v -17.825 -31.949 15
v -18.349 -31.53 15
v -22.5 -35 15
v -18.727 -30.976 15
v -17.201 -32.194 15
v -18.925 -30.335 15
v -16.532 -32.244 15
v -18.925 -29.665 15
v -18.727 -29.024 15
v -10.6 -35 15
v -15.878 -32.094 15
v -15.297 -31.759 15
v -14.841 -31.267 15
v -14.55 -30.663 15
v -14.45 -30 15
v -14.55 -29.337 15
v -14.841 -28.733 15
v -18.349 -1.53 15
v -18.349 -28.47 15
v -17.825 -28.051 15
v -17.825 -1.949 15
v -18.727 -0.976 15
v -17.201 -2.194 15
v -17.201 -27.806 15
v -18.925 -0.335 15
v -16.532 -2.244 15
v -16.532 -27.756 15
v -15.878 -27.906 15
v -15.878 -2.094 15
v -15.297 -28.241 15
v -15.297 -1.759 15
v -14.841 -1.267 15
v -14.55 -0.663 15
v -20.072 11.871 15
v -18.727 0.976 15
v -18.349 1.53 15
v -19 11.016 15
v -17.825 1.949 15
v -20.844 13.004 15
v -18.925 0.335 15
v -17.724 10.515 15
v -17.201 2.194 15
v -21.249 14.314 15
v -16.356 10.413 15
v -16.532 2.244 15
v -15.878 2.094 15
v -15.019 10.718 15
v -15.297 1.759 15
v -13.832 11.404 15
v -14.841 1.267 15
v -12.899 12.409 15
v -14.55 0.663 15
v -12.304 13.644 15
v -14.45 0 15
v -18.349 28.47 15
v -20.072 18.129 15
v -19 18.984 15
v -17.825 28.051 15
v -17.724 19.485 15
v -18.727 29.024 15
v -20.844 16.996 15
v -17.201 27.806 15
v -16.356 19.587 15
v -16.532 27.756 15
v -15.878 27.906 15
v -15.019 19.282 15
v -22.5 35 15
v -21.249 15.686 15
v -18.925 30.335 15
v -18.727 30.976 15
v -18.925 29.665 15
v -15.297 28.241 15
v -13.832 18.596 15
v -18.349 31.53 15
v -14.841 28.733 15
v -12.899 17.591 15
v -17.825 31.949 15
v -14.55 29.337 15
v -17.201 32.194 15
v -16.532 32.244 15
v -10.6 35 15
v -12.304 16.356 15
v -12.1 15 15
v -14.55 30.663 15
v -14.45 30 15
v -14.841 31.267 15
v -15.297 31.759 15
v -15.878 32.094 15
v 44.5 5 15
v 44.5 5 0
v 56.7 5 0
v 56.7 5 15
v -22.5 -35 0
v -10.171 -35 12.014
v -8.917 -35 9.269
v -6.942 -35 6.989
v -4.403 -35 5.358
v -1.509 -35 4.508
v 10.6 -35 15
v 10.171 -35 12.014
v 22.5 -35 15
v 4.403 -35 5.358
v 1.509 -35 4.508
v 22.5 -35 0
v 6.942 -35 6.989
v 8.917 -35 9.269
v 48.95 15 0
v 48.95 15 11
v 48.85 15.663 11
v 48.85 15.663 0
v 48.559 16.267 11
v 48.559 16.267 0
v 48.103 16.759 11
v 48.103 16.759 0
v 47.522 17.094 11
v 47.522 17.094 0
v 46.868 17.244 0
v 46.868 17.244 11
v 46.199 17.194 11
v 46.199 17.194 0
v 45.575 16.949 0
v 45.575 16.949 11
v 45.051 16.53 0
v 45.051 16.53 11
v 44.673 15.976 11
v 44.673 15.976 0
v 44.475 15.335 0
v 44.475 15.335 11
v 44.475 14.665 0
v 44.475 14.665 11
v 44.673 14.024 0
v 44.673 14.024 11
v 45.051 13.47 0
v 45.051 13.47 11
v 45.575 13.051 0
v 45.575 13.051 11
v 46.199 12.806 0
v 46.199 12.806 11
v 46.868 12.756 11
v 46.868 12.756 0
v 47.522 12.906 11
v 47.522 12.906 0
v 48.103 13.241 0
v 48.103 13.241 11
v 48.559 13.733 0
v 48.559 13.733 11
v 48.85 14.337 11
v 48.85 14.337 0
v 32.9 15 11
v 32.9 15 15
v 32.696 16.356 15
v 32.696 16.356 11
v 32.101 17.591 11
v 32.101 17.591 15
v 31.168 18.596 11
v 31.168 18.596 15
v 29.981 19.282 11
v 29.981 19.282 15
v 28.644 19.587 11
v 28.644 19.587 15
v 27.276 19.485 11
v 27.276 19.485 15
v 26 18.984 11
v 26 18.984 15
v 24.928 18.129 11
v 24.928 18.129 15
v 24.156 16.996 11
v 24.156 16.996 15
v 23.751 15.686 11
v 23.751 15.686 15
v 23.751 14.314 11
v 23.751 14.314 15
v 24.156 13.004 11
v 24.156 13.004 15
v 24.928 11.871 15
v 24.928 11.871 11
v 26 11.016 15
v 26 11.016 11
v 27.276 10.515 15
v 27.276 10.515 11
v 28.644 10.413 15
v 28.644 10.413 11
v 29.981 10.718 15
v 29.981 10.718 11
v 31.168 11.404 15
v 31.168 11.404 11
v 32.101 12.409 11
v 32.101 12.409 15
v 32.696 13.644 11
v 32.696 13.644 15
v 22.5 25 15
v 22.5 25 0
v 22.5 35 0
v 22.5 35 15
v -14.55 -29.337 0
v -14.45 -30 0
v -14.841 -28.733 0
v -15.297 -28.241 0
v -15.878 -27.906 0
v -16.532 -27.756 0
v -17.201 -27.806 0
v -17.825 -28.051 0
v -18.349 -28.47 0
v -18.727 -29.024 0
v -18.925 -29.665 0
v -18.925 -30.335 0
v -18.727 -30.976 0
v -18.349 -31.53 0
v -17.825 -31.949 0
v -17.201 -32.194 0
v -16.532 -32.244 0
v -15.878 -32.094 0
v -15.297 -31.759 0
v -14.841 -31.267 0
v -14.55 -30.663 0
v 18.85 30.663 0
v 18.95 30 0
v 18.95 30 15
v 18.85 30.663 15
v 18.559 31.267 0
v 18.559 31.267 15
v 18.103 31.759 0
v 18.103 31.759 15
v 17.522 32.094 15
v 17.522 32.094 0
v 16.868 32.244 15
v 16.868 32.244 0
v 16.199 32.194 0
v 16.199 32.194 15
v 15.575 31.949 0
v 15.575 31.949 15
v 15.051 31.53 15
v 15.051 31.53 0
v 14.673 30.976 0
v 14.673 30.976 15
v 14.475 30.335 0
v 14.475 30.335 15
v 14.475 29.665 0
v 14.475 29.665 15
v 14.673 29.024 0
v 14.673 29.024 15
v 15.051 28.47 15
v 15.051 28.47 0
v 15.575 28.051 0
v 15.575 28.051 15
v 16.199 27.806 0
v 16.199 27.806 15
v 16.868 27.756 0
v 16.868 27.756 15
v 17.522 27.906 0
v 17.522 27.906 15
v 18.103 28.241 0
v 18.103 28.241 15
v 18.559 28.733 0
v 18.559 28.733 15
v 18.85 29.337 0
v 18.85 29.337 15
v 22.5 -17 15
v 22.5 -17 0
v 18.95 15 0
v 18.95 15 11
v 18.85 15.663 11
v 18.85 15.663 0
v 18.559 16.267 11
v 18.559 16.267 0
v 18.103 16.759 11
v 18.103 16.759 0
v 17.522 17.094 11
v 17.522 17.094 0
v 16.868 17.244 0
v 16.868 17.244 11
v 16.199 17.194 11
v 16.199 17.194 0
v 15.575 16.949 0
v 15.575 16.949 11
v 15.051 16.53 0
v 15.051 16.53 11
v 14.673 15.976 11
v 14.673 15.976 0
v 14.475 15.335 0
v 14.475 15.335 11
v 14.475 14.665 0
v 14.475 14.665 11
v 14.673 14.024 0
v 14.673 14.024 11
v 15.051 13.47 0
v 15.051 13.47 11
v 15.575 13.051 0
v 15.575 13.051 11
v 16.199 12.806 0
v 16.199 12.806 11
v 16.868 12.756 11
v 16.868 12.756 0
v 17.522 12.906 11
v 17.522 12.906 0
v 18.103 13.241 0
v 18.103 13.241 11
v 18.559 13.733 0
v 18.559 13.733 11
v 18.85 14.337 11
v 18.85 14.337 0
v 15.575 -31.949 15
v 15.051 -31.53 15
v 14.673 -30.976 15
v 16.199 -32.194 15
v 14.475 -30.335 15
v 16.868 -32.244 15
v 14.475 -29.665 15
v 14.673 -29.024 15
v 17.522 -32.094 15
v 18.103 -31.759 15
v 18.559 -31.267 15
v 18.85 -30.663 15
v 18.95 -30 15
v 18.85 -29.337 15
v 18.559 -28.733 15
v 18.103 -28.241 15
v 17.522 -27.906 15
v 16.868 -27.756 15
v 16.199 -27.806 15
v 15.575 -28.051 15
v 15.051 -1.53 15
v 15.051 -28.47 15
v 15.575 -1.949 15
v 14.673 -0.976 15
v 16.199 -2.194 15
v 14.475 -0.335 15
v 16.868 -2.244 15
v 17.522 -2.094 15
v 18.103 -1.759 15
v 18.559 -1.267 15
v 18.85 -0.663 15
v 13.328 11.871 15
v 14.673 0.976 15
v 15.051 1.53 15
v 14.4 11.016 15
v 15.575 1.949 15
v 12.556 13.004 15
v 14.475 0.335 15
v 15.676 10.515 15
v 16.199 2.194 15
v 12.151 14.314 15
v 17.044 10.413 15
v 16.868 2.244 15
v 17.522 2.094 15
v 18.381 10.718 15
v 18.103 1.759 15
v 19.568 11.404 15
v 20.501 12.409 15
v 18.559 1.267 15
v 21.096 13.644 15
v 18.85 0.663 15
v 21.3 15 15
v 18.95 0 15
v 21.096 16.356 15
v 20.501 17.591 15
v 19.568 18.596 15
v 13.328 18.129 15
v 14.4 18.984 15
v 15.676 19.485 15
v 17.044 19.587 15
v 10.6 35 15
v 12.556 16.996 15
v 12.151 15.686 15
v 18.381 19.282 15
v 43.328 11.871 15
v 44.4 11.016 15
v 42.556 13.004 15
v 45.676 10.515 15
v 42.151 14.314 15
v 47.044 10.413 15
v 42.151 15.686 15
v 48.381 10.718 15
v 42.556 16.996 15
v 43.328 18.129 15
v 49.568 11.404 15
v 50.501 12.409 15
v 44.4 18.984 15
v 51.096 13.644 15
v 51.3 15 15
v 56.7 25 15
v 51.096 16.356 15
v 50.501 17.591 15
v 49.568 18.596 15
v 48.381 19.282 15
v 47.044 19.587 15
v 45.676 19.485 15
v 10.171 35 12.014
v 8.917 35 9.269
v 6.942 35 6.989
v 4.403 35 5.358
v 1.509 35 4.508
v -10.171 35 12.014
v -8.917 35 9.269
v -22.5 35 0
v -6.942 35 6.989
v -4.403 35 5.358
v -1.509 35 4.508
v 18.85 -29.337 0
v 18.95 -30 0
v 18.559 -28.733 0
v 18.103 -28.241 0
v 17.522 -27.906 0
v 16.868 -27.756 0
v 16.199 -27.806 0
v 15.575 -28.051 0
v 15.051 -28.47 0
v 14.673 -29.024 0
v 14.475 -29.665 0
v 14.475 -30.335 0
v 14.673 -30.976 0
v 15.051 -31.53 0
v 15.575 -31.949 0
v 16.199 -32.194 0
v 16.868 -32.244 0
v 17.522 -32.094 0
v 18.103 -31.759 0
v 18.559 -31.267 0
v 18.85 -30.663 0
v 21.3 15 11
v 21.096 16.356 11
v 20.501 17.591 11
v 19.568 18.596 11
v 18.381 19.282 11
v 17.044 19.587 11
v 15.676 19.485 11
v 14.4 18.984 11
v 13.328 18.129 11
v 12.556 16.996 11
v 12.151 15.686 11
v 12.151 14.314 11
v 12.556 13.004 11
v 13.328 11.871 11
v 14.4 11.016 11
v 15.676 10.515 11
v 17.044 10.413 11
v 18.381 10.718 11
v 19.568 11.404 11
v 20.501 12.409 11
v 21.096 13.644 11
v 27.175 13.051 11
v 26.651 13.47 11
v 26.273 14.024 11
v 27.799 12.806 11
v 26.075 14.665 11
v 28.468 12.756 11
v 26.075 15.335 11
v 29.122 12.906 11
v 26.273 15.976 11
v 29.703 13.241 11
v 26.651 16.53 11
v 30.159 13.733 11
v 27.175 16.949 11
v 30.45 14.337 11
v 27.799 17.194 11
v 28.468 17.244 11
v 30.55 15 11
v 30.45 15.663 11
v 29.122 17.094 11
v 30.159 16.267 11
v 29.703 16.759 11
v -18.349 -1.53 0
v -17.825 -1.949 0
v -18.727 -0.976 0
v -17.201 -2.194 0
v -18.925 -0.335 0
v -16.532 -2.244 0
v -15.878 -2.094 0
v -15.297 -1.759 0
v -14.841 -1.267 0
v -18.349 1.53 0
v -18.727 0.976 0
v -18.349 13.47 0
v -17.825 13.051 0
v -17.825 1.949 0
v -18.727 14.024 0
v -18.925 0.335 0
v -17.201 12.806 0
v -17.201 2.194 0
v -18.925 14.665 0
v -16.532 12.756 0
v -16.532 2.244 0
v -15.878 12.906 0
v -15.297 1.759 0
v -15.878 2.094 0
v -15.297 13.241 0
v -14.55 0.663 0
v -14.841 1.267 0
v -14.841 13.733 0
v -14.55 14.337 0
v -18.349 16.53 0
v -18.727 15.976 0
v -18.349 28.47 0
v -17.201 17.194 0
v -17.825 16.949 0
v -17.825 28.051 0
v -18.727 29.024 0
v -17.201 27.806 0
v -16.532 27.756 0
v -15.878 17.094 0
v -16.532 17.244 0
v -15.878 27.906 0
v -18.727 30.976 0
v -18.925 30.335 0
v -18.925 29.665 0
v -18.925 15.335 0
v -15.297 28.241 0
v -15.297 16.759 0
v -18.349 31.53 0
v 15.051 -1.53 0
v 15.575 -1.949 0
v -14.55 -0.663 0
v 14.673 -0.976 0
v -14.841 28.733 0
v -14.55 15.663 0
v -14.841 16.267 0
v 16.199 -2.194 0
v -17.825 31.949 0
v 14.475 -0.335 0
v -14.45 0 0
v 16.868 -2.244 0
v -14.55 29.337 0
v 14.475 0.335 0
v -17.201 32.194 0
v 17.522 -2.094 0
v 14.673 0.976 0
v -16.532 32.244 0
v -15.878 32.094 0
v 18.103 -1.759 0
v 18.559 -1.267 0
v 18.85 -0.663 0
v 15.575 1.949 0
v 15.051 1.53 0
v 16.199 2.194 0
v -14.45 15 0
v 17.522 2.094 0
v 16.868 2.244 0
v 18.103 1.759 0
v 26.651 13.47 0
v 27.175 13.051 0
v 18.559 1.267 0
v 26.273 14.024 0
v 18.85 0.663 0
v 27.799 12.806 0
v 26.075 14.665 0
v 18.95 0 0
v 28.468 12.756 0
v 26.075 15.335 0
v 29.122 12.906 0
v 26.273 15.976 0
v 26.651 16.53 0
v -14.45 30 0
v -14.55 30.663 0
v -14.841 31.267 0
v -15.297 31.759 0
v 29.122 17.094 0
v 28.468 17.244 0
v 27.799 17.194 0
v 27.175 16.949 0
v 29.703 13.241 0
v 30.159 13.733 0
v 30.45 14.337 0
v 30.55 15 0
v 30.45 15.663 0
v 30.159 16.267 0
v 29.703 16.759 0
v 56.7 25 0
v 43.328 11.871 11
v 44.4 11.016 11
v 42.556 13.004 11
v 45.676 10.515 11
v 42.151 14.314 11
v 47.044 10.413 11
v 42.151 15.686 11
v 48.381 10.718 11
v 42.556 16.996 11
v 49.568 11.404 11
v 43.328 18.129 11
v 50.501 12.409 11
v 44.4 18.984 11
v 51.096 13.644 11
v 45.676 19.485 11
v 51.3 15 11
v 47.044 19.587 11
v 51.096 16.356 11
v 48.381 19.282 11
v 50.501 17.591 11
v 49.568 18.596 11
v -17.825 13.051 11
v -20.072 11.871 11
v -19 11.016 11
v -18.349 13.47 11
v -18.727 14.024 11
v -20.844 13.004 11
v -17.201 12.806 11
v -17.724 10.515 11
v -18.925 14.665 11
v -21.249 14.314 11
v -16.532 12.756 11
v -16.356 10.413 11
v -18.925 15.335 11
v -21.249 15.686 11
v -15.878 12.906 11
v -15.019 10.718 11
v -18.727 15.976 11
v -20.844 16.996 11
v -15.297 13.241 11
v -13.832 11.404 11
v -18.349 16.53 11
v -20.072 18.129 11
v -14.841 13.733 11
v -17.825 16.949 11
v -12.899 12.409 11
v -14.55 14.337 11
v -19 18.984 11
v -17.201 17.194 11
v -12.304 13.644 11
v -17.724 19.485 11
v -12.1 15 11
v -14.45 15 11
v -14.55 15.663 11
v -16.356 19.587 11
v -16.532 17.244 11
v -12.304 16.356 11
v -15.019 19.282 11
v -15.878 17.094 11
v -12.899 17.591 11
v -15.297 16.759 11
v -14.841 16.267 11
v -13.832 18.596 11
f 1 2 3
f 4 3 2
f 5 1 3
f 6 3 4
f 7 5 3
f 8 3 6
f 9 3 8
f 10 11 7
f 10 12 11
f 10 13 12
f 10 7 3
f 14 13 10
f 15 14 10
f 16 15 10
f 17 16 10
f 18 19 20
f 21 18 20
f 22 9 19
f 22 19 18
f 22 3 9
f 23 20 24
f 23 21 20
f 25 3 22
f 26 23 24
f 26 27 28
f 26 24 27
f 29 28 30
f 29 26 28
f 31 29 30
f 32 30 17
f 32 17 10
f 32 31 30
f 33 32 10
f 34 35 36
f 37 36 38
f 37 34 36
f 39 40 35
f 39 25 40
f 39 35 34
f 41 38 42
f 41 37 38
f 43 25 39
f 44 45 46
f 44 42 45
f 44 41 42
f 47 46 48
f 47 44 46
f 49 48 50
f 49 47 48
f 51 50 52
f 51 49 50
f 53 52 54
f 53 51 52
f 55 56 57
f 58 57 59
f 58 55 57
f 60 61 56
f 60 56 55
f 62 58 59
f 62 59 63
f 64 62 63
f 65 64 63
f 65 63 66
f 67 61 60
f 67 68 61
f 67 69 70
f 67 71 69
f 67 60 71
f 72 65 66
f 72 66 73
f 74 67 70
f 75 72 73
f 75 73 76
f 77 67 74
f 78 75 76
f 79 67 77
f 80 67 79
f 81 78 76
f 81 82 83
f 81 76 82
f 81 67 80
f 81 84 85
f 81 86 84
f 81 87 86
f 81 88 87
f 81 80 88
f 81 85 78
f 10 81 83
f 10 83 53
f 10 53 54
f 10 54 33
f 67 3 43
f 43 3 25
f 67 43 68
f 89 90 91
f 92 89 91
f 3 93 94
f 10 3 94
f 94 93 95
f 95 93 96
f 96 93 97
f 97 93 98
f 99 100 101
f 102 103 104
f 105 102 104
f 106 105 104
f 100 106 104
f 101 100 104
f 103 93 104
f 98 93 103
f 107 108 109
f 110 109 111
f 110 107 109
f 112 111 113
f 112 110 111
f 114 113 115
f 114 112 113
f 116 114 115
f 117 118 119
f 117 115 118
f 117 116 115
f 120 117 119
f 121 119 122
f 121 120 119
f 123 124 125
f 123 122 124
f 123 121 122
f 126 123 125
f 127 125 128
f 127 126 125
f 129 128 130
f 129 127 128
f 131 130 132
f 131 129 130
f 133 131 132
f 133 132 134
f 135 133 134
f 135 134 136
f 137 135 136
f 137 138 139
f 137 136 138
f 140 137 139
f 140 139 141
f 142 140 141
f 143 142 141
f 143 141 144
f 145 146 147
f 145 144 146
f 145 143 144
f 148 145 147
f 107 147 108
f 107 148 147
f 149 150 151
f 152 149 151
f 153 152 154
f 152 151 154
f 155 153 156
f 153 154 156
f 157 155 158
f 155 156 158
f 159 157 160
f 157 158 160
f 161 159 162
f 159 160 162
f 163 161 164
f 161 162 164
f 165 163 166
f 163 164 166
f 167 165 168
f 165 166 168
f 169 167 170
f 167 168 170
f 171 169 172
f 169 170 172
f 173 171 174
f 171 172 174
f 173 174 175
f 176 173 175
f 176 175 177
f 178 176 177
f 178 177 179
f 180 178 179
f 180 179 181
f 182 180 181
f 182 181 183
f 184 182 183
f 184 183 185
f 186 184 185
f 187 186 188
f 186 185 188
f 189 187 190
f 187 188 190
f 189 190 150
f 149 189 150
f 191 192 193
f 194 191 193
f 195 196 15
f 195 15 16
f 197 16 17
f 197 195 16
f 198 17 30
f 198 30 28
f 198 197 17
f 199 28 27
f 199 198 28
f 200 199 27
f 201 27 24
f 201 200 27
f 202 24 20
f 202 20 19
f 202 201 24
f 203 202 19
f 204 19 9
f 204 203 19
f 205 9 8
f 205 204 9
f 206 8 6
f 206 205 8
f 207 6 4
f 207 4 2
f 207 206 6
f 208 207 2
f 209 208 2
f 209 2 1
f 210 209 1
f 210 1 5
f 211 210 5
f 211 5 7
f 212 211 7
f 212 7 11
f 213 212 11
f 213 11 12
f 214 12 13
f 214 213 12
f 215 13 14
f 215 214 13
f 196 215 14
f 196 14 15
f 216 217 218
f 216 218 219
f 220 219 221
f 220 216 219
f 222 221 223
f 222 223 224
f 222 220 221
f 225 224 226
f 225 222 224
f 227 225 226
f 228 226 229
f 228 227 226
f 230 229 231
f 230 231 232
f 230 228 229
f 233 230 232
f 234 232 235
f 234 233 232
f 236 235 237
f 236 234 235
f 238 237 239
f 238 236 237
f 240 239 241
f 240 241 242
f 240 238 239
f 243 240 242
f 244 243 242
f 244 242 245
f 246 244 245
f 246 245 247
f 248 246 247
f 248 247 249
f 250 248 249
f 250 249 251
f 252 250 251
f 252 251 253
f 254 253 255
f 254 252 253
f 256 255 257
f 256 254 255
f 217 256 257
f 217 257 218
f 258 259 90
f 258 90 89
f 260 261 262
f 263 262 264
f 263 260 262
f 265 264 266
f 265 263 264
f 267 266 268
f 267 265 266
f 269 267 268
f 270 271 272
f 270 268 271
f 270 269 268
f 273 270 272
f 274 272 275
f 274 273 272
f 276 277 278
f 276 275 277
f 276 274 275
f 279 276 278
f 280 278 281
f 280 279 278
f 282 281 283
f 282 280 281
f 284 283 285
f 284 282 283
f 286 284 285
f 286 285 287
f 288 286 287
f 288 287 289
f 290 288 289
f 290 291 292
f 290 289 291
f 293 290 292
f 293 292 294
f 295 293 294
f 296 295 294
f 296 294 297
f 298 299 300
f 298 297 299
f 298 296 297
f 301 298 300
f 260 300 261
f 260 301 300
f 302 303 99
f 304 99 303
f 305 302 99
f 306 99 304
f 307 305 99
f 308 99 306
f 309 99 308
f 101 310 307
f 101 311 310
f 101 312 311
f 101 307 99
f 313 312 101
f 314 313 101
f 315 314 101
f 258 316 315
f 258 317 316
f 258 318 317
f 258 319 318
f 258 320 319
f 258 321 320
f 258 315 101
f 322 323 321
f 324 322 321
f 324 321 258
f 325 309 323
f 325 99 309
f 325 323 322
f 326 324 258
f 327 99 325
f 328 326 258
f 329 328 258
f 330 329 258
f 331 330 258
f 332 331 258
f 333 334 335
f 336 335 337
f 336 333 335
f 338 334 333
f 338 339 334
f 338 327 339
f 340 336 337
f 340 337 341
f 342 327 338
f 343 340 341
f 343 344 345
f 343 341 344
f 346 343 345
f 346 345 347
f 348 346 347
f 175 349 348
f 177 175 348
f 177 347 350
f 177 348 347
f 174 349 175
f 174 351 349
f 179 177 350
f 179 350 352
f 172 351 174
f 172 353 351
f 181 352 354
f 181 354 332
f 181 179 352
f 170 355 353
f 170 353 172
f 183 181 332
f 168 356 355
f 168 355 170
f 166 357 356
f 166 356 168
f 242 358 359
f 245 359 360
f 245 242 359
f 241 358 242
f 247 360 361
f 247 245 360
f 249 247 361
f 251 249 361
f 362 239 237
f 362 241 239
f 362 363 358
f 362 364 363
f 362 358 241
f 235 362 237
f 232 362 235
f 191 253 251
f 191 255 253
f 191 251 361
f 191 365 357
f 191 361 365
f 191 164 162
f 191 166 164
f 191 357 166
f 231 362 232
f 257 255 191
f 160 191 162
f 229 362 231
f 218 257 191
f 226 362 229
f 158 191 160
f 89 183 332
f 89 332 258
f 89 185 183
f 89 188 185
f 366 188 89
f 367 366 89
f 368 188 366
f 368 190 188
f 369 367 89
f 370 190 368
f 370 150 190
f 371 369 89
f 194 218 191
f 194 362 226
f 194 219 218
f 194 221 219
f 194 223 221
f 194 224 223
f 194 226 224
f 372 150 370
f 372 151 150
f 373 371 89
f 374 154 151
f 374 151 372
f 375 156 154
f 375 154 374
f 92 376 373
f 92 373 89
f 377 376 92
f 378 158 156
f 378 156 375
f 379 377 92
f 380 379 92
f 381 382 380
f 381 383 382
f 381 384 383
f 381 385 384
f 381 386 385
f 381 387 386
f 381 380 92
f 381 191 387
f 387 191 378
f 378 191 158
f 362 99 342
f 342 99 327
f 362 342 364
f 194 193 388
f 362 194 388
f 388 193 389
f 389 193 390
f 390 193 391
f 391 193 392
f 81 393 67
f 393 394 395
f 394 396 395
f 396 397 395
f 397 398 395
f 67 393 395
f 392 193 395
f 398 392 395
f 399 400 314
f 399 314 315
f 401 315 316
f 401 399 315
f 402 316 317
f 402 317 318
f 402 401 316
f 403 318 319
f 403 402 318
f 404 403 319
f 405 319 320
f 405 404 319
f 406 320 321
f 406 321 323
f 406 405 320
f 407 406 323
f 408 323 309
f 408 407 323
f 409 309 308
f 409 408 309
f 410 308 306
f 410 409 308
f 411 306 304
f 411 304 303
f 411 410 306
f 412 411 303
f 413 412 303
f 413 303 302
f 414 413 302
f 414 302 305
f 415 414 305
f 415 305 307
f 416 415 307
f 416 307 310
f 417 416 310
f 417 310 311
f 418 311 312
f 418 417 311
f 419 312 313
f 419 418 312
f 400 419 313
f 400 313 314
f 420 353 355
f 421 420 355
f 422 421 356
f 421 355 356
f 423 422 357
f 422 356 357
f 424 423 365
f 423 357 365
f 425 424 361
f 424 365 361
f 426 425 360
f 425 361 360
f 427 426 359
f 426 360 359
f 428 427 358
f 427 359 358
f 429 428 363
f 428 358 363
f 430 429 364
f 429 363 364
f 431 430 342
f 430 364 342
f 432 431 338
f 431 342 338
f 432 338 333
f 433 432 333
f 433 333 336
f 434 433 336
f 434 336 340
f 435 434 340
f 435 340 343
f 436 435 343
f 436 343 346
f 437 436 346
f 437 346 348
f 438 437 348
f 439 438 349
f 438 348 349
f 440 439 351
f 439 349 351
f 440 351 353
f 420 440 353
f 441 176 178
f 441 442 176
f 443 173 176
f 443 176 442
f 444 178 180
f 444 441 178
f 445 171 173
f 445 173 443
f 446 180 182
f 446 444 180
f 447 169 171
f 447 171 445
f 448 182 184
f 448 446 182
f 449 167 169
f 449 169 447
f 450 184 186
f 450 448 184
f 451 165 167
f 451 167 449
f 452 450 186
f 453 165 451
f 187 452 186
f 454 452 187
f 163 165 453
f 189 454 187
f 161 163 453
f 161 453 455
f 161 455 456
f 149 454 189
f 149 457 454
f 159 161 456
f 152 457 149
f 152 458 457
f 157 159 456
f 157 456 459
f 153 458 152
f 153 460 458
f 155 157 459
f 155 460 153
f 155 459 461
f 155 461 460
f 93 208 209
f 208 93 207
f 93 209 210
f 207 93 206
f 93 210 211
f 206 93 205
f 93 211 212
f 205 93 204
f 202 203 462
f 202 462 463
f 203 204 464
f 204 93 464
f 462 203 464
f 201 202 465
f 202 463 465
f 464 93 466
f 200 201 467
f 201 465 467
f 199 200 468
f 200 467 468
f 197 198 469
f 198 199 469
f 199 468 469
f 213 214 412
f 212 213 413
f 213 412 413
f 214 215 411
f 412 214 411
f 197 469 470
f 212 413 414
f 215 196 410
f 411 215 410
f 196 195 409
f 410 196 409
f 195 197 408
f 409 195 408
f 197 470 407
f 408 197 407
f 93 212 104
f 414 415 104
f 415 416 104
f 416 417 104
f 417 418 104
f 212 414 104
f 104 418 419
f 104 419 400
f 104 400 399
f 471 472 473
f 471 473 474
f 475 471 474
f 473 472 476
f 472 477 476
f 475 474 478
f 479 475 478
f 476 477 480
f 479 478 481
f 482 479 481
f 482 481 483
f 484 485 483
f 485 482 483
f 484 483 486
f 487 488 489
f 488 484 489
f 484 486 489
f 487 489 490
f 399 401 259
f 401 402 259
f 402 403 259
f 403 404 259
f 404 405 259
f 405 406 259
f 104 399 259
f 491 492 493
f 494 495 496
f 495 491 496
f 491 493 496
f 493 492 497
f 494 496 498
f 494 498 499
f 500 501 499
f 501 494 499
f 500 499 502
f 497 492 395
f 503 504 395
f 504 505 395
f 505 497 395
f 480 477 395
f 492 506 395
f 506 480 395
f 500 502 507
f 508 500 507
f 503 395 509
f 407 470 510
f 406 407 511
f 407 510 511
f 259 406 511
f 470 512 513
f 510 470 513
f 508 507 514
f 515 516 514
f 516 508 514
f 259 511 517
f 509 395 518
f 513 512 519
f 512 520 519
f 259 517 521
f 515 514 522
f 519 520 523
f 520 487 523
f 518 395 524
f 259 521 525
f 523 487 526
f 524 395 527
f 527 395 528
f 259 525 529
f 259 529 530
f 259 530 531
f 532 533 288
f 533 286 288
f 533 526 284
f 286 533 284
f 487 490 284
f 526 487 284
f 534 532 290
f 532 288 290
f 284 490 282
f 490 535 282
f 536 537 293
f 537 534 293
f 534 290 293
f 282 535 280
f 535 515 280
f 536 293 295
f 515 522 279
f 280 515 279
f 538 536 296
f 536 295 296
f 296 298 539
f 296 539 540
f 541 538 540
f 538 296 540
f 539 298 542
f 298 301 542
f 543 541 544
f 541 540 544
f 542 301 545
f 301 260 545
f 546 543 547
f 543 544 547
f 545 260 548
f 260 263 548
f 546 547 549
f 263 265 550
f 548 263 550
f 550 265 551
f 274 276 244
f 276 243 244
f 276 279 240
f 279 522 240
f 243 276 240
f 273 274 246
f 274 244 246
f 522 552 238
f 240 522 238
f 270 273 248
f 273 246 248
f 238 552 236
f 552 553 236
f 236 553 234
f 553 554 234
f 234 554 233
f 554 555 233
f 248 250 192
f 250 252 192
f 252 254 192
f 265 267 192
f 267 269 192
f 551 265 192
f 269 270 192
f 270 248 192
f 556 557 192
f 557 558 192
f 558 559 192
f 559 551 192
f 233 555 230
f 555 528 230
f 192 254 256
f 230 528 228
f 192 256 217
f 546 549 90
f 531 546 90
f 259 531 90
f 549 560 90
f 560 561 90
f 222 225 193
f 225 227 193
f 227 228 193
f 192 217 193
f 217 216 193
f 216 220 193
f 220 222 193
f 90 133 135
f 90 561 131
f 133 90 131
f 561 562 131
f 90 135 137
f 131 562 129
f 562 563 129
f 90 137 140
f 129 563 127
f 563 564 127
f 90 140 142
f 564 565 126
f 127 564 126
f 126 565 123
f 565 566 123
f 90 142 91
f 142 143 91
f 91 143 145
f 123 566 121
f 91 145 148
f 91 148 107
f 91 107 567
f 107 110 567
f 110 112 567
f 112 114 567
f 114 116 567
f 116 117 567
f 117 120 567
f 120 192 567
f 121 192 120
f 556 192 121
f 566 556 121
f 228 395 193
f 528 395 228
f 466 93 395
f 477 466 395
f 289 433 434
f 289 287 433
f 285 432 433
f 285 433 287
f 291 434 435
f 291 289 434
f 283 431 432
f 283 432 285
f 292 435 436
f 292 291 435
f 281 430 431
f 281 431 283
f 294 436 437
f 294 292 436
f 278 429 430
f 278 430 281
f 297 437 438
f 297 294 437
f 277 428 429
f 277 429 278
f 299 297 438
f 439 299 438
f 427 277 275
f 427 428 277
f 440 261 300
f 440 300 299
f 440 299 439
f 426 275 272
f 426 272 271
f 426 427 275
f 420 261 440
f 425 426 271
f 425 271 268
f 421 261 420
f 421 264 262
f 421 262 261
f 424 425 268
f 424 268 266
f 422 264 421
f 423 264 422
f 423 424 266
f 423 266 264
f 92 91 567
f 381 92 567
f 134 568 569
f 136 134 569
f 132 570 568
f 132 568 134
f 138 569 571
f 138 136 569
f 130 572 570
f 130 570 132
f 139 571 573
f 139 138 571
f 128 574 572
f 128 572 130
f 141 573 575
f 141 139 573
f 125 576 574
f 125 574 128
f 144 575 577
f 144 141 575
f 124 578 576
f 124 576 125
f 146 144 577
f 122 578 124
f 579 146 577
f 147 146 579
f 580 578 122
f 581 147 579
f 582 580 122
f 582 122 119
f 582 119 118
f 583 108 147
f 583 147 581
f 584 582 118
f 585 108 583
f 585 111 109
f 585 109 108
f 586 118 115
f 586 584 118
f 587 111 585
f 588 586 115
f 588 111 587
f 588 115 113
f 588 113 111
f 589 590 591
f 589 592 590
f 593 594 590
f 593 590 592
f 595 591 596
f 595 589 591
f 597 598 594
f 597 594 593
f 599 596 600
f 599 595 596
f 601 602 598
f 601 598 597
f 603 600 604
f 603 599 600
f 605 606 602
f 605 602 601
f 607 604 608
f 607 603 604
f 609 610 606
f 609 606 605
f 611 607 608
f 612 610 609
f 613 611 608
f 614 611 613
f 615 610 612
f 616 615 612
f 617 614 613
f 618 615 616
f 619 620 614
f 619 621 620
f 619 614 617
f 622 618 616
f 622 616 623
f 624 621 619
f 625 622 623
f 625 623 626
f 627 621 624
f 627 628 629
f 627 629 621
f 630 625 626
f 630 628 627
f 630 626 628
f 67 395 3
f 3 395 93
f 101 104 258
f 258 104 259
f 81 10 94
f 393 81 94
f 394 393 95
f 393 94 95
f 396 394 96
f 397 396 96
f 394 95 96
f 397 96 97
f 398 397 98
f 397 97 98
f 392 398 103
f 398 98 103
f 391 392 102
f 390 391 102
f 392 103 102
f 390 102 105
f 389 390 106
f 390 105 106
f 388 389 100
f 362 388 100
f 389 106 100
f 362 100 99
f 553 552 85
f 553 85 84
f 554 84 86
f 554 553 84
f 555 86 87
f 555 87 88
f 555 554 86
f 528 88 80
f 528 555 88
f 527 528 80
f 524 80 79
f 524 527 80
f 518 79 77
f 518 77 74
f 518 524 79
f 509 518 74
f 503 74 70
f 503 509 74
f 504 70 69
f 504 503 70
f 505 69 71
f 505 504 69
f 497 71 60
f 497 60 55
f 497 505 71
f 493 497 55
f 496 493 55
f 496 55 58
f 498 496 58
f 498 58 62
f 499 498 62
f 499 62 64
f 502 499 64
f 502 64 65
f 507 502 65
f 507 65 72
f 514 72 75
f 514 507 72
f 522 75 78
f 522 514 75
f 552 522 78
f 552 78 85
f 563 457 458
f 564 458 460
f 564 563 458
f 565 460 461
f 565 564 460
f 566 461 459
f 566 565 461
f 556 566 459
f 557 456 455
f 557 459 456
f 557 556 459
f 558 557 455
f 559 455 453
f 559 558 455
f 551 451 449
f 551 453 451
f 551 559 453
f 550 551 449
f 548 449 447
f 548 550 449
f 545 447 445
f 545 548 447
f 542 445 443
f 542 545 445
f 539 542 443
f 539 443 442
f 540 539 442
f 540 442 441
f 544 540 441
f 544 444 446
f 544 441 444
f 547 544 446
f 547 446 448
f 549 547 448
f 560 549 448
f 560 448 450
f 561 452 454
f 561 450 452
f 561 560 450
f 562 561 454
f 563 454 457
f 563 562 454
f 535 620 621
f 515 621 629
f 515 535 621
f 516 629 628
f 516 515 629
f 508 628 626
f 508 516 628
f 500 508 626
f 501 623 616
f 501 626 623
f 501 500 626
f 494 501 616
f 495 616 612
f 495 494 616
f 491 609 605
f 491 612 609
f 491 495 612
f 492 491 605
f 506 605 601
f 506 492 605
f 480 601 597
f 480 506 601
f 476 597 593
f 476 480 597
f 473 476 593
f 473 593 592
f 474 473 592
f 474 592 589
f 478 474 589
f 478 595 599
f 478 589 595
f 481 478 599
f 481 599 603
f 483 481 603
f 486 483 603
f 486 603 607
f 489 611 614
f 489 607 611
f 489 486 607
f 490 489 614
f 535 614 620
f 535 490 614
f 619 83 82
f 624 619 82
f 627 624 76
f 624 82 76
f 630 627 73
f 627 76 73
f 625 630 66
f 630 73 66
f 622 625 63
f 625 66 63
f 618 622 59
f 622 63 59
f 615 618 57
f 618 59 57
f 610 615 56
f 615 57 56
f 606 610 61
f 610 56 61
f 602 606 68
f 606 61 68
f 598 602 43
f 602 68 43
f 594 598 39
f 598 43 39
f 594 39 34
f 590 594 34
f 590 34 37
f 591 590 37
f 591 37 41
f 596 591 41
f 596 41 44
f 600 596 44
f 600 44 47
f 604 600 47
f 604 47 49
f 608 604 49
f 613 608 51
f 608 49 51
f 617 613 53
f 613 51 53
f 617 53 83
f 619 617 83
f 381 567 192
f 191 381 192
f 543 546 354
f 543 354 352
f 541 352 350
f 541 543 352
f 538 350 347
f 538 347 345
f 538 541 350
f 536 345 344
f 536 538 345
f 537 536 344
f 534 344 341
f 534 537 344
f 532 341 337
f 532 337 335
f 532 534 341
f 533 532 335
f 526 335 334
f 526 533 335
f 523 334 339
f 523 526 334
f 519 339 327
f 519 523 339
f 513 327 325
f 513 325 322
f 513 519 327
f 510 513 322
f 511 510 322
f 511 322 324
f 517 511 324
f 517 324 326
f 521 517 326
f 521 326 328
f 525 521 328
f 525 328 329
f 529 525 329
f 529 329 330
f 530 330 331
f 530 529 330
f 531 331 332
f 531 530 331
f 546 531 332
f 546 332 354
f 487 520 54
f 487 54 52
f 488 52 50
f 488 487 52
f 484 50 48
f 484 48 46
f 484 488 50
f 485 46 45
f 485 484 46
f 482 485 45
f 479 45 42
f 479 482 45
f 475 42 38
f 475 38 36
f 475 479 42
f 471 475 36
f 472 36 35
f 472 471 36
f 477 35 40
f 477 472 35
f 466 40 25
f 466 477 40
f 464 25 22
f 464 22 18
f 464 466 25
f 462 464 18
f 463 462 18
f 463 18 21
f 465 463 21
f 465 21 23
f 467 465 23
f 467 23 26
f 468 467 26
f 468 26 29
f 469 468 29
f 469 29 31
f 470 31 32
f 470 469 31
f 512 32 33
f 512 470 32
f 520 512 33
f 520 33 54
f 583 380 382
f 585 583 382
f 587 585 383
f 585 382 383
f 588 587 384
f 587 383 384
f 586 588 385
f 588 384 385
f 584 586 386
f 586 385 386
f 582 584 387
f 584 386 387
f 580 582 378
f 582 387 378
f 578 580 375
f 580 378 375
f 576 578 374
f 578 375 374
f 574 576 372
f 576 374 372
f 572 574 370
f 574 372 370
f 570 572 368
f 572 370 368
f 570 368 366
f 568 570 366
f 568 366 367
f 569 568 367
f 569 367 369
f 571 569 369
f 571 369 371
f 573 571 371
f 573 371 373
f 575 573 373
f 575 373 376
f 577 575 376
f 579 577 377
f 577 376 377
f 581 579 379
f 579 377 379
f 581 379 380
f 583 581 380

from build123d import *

# Parameters (mm, degrees)
SKETCH_R        = 2.25
PAD_DEPTH       = 15
SKETCH001_R     = 10.6
POCKET_DEPTH    = 70.001
SKETCH002_R     = 4.6
POCKET001_DEPTH = 4
CHAMFER_SIZE    = 22


with BuildPart() as part:
    # Sketch → Pad (new body)
    with BuildSketch(Plane.XY):
        Polygon((-22.5, -35), (22.5, -35), (22.5, 5), (56.7, 5), (56.7, 25), (22.5, 25), (22.5, 35), (-22.5, 35), align=None)
        with Locations((-16.7, 30)):
            Circle(SKETCH_R, mode=Mode.SUBTRACT)
        with Locations((16.7, 30)):
            Circle(SKETCH_R, mode=Mode.SUBTRACT)
        with Locations((-16.7, -30)):
            Circle(SKETCH_R, mode=Mode.SUBTRACT)
        with Locations((16.7, -30)):
            Circle(SKETCH_R, mode=Mode.SUBTRACT)
        with Locations((-16.7, 0)):
            Circle(SKETCH_R, mode=Mode.SUBTRACT)
        with Locations((16.7, 0)):
            Circle(SKETCH_R, mode=Mode.SUBTRACT)
        with Locations((16.7, 15)):
            Circle(SKETCH_R, mode=Mode.SUBTRACT)
        with Locations((46.7, 15)):
            Circle(SKETCH_R, mode=Mode.SUBTRACT)
        with Locations((-16.7, 15)):
            Circle(SKETCH_R, mode=Mode.SUBTRACT)
        with Locations((28.3, 15)):
            Circle(SKETCH_R, mode=Mode.SUBTRACT)
    extrude(amount=PAD_DEPTH)

    # Sketch001 → Pocket (cut, through all)
    with BuildSketch(Plane.XZ.offset(35)):
        with Locations((0, 15)):
            Circle(SKETCH001_R)
    extrude(amount=-POCKET_DEPTH, mode=Mode.SUBTRACT)

    # Sketch002 → Pocket001 (cut)
    with BuildSketch(Plane.XY.offset(15)):
        with Locations((-16.7, 15)):
            Circle(SKETCH002_R)
        with Locations((16.7, 15)):
            Circle(SKETCH002_R)
        with Locations((28.3, 15)):
            Circle(SKETCH002_R)
        with Locations((46.7, 15)):
            Circle(SKETCH002_R)
    extrude(amount=-POCKET001_DEPTH, mode=Mode.SUBTRACT)

    # Chamfer
    chamfer_edges = [part.edges().sort_by_distance(p)[0] for p in [
        (22.5, 5, 7.5),
    ]]
    chamfer(chamfer_edges, length=CHAMFER_SIZE)


solid = part.part
